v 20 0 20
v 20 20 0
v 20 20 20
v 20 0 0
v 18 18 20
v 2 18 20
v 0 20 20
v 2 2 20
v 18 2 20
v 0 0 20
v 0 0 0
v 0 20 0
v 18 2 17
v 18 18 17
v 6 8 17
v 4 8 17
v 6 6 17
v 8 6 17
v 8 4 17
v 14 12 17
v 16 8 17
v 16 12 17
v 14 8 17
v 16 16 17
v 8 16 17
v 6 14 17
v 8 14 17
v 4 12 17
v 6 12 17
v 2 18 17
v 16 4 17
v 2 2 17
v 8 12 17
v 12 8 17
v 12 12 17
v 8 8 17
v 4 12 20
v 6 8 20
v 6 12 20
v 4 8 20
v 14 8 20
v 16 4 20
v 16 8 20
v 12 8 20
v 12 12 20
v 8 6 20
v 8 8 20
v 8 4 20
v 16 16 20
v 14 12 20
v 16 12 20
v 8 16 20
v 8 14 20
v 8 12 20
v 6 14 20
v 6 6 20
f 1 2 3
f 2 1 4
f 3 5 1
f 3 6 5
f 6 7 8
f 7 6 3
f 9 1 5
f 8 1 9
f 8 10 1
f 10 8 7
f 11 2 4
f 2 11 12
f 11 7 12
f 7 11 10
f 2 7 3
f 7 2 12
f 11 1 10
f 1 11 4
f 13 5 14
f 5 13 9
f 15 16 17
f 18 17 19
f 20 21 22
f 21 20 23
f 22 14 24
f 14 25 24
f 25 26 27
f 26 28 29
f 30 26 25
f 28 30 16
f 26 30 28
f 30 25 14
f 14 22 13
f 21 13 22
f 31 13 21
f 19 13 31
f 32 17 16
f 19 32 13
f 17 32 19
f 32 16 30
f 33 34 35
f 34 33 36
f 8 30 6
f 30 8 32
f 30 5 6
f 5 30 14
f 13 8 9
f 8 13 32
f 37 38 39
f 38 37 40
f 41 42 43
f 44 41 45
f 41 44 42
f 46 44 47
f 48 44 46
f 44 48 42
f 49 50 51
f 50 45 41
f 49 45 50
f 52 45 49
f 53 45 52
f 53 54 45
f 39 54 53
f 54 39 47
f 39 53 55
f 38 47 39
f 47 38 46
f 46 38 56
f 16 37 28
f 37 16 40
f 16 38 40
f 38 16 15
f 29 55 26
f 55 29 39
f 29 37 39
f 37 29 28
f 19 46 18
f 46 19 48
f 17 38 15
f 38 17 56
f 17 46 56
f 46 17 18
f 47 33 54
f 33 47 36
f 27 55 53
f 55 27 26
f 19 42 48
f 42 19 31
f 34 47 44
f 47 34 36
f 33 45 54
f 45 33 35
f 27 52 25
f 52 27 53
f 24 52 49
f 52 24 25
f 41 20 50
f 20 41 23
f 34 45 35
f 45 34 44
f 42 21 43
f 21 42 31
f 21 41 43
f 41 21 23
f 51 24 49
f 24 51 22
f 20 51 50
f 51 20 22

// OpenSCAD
/*
Parametric Alphabet Block
Tony Buser <tbuser@gmail.com>
http://tonybuser.com
http://creativecommons.org/licenses/by/3.0/
*/

use <bitmap.scad>

// change to any letter
letter = "A";

union()
{
  difference()
  {
    cube(size = 20);
    translate(v = [ 2, 2, 17 ]) { cube(size = [ 16, 16, 5 ]); }
  }

  translate(v = [ 10, 10, 15 ]) { 8bit_char(letter, 2, 5); }
}
